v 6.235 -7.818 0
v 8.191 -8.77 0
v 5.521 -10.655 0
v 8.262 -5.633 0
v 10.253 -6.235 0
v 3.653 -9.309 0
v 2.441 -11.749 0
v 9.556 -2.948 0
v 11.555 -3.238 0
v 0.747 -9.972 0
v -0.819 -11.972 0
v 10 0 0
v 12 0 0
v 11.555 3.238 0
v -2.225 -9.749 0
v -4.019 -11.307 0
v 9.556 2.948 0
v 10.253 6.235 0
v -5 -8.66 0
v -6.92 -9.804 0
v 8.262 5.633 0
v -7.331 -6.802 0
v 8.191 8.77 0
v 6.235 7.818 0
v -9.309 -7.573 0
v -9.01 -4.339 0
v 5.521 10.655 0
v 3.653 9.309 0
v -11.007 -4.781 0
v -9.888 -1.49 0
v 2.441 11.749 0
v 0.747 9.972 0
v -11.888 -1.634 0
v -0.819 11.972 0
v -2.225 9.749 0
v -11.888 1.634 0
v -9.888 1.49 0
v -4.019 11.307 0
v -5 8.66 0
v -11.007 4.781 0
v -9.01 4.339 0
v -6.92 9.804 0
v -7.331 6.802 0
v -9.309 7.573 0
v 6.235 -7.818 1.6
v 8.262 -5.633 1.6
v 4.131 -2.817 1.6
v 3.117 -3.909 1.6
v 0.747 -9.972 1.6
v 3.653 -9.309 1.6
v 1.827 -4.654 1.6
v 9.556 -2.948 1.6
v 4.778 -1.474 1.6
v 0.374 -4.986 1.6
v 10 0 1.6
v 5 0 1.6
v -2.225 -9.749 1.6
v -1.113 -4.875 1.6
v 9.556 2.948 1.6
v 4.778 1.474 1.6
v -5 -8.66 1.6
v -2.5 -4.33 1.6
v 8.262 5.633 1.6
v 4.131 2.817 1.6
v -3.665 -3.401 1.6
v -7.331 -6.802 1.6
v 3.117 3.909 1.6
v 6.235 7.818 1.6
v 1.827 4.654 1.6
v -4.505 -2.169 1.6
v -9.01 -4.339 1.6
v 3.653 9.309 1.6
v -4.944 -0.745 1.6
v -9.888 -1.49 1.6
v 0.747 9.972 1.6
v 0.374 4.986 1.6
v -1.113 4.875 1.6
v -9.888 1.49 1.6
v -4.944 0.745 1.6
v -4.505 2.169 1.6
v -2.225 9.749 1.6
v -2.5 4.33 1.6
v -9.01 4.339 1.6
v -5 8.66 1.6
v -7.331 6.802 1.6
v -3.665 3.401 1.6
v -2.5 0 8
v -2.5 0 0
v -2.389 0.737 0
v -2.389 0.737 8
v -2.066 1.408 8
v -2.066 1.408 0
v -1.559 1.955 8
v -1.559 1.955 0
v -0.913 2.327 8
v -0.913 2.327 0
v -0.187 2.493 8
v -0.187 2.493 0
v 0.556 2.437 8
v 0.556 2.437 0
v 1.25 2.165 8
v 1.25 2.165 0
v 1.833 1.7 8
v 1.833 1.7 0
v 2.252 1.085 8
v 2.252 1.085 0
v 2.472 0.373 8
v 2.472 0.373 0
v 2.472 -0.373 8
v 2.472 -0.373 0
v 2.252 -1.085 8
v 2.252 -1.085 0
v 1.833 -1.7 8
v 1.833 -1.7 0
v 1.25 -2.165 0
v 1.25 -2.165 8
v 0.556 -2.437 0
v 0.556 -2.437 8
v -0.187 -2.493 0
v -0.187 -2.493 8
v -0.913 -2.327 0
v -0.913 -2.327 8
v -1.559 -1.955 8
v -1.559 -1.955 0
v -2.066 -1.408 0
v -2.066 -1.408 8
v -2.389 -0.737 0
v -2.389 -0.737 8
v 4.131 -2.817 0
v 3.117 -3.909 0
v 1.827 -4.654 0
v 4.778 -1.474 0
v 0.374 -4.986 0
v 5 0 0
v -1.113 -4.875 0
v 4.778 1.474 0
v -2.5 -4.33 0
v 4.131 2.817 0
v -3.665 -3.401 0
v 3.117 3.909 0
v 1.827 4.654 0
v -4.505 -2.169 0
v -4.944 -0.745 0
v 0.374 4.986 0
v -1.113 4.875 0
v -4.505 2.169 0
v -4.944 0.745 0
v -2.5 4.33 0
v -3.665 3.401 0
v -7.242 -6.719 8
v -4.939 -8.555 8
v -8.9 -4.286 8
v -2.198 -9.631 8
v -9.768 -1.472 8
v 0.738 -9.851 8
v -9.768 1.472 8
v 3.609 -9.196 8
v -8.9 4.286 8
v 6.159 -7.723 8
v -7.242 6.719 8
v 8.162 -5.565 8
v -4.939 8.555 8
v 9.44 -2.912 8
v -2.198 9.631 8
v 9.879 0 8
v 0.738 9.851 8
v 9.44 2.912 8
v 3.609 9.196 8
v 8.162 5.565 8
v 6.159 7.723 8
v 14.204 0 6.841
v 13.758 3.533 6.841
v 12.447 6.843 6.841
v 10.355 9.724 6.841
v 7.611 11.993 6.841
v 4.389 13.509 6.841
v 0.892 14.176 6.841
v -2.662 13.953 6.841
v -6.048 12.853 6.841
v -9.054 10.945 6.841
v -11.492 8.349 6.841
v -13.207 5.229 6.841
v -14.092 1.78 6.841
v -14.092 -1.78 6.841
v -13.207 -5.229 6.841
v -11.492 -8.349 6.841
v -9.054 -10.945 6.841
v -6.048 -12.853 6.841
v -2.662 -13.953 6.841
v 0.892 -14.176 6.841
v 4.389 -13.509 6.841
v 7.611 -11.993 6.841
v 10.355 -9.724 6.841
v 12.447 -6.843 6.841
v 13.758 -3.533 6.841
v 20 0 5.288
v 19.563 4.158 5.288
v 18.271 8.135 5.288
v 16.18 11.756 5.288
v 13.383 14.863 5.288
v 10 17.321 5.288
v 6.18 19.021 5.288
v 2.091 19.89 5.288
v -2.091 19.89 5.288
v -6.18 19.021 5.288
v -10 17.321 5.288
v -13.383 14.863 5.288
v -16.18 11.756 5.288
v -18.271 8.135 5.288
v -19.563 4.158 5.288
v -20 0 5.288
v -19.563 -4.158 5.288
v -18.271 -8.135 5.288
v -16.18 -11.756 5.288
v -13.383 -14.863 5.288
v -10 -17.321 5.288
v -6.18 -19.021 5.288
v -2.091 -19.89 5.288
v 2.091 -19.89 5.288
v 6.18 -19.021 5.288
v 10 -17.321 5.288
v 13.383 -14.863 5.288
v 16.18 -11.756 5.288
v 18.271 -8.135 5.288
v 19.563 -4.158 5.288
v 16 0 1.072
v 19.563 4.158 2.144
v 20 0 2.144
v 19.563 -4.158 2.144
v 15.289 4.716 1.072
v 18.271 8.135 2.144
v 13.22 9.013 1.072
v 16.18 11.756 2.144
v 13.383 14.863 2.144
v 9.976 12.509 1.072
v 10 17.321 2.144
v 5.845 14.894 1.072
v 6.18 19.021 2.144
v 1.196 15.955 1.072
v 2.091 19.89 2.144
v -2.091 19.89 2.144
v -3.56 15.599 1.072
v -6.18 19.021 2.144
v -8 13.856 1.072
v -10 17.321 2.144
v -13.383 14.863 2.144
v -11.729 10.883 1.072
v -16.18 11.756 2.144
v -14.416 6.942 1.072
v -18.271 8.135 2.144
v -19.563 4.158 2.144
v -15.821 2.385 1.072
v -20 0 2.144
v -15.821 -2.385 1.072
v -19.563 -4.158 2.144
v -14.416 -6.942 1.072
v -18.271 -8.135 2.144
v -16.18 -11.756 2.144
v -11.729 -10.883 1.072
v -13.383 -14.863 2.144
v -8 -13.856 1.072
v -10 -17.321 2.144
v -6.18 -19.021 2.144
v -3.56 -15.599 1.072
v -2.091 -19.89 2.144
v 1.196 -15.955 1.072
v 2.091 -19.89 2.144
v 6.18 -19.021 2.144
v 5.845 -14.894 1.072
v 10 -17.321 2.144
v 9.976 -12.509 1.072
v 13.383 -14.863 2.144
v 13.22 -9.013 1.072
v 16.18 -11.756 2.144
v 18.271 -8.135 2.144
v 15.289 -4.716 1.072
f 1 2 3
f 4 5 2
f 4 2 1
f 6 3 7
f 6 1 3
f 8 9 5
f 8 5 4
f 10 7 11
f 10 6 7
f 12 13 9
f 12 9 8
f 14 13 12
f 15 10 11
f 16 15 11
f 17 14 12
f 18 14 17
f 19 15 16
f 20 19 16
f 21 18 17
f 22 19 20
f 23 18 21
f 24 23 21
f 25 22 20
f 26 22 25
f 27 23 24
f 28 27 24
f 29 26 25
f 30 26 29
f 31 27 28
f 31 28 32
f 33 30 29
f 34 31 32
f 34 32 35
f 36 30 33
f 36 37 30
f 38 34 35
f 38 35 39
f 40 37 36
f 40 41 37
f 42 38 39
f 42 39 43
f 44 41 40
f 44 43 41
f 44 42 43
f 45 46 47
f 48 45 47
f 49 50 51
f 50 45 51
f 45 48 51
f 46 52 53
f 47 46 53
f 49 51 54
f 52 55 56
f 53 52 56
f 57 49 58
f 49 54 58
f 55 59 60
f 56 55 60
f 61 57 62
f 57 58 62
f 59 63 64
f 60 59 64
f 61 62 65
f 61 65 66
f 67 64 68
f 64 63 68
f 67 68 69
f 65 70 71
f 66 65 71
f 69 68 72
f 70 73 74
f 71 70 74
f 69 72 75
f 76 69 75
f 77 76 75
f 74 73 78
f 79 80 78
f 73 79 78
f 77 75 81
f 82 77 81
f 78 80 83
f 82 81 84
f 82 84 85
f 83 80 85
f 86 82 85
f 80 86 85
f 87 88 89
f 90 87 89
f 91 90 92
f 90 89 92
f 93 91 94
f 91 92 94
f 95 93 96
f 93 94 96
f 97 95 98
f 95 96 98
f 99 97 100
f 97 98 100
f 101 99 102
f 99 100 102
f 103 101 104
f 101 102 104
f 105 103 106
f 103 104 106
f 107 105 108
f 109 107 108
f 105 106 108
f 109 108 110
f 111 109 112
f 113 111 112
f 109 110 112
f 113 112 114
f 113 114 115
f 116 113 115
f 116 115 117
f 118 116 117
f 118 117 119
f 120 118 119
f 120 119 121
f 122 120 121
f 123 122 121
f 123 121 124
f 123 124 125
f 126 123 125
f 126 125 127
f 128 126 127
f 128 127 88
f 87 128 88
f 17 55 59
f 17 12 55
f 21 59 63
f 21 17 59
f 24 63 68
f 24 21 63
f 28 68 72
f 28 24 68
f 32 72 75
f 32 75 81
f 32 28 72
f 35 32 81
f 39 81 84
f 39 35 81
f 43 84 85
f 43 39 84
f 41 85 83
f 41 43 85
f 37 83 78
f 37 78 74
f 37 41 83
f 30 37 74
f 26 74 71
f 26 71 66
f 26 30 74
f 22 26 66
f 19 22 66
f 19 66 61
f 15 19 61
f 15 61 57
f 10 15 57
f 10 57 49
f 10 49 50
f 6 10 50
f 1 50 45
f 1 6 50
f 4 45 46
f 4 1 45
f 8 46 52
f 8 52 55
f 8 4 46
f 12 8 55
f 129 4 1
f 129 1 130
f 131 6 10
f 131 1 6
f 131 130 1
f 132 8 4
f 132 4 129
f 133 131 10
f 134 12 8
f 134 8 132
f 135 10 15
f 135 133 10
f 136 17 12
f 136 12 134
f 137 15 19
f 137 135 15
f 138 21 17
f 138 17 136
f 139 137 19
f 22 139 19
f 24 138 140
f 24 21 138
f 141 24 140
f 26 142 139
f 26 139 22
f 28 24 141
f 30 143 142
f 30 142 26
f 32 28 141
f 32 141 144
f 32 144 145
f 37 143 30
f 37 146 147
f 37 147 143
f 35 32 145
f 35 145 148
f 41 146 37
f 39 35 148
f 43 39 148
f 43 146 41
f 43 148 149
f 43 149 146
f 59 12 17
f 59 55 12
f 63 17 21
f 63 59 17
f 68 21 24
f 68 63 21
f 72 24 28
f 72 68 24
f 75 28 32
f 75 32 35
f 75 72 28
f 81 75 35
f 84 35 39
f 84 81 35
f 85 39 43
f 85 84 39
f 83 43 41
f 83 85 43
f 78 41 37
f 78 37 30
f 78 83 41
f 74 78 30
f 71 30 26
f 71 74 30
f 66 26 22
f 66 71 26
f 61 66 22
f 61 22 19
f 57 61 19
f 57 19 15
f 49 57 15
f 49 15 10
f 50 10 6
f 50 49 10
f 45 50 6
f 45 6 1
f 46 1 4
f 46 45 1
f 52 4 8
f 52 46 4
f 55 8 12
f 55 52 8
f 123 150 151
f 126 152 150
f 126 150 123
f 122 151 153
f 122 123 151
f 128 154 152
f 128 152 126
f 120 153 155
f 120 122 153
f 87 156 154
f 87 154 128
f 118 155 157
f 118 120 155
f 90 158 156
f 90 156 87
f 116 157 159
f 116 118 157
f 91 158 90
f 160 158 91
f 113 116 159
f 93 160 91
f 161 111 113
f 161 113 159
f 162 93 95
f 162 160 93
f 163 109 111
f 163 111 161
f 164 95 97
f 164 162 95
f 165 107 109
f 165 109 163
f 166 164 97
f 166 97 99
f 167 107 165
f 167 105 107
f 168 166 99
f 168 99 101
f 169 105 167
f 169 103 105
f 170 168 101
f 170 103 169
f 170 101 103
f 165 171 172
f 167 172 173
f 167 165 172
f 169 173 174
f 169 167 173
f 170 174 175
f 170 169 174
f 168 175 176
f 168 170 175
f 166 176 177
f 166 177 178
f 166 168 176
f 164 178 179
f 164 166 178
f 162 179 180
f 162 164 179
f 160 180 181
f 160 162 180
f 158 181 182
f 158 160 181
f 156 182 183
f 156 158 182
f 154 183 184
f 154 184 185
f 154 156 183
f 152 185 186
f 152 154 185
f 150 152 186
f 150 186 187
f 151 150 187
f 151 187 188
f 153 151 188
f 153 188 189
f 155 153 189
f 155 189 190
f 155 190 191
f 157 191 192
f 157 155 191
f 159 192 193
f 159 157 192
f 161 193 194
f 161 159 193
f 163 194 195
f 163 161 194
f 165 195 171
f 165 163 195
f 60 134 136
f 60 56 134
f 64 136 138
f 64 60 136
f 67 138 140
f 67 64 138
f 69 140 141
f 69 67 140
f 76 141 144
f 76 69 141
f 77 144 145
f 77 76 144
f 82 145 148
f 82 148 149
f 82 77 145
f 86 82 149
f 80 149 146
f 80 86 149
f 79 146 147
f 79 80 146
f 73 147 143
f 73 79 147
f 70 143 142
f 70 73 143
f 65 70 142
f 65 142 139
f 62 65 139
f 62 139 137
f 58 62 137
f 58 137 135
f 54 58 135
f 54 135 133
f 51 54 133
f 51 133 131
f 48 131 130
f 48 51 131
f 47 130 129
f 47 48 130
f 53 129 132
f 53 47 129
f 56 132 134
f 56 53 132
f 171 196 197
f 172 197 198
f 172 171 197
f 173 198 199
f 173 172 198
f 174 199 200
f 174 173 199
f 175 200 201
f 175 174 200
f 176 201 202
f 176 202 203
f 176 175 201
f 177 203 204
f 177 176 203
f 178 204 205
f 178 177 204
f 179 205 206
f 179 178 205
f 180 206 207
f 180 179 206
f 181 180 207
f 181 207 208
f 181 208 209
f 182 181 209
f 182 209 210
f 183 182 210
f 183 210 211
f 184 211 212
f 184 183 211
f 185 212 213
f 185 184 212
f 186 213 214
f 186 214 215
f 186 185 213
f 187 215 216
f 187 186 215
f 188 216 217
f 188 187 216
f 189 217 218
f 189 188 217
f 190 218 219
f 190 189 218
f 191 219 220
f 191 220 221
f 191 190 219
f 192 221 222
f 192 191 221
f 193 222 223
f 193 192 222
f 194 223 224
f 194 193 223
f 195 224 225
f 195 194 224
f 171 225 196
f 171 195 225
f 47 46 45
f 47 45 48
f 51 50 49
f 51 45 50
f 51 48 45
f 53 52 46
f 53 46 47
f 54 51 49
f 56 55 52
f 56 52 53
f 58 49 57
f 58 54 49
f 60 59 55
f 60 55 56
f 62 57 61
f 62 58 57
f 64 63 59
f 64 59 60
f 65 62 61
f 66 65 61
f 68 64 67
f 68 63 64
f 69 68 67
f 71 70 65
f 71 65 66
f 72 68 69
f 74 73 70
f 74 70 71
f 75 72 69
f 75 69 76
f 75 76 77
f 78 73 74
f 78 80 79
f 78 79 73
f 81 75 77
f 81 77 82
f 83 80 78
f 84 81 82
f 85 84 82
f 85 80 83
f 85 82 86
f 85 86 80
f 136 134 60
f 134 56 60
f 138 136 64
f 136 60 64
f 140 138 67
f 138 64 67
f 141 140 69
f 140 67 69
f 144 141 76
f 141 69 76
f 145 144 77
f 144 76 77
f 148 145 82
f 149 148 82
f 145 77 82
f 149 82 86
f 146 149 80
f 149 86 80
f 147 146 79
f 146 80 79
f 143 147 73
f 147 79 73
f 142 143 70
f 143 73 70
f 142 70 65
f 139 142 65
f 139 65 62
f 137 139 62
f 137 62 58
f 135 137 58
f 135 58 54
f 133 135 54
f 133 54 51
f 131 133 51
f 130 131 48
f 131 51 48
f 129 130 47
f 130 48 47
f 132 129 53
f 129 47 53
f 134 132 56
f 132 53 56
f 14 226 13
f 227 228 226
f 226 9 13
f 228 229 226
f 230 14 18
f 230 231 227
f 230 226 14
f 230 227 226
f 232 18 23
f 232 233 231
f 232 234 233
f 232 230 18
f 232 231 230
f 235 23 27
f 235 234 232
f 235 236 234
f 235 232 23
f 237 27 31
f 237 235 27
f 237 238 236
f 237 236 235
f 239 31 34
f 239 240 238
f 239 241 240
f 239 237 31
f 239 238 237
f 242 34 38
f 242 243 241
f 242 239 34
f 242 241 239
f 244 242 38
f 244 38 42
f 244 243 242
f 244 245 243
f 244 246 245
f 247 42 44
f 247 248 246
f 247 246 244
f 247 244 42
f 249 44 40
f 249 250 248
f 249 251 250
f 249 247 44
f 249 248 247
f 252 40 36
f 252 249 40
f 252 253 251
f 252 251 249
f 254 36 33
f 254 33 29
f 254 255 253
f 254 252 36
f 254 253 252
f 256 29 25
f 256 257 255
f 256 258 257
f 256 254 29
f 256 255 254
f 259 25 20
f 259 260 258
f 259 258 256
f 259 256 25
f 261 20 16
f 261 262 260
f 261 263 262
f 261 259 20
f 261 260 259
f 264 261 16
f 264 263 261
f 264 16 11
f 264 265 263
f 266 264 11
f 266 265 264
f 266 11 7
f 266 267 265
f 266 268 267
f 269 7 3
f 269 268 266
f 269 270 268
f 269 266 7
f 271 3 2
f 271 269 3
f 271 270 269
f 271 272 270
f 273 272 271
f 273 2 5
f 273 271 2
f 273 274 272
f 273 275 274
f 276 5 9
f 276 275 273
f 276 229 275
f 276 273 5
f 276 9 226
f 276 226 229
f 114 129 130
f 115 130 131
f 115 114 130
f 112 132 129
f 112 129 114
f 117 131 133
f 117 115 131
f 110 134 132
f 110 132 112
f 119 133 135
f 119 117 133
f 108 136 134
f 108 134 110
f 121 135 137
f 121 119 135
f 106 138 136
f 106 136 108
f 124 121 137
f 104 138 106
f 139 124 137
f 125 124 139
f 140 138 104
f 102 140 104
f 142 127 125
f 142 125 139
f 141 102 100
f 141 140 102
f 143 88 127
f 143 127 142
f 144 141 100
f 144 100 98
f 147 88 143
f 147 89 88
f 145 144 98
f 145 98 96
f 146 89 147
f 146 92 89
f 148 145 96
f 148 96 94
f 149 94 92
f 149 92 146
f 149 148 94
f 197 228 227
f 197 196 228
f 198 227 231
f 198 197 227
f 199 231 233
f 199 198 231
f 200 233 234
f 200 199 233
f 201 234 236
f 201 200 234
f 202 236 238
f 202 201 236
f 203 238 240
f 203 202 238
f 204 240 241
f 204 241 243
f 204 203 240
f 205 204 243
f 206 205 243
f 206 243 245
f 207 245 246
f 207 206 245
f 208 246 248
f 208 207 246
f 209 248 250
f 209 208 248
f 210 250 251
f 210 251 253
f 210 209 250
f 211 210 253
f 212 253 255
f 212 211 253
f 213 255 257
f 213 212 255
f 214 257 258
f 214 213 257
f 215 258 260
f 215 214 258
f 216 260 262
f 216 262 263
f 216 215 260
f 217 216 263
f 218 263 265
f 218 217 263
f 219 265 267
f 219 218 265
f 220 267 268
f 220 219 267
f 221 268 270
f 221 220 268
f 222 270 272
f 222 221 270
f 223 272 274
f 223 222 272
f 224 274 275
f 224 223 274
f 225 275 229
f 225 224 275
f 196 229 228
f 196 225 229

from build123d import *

# Parameters (mm, degrees)
F0_W = 5
F0_H = 1.6
F4_D = 5


with BuildPart() as f1:
    # F0 (on Front) → F1 (revolve)
    with BuildSketch(Plane.XZ):
        with Locations((7.5, 0.8)):
            Rectangle(F0_W, F0_H)
    revolve(axis=Axis((0, 0, 0.8), (0, 0, 1)))


with BuildPart() as f2:
    # F0 (on Front) → F2 (revolve)
    with BuildSketch(Plane.XZ):
        Polygon((0, 8), (0, 1.6), (5, 1.6), (10, 1.6), (10, 0), (12, 0), (20, 2.1435935394), (20, 5.2879747378), (14.2044450423, 6.8408890085), (9.8785839302, 8), align=None)
        with Locations((2.5, 0.8)):
            Rectangle(F0_W, F0_H)
    revolve(axis=Axis((0, 0, 4), (0, 0, 1)))

    # F4 (through all)
    with Locations(Plane.XY.offset(8)):
        with Locations((0, 0)):
            Hole(F4_D / 2)


solid = Compound([f1.part, f2.part])
